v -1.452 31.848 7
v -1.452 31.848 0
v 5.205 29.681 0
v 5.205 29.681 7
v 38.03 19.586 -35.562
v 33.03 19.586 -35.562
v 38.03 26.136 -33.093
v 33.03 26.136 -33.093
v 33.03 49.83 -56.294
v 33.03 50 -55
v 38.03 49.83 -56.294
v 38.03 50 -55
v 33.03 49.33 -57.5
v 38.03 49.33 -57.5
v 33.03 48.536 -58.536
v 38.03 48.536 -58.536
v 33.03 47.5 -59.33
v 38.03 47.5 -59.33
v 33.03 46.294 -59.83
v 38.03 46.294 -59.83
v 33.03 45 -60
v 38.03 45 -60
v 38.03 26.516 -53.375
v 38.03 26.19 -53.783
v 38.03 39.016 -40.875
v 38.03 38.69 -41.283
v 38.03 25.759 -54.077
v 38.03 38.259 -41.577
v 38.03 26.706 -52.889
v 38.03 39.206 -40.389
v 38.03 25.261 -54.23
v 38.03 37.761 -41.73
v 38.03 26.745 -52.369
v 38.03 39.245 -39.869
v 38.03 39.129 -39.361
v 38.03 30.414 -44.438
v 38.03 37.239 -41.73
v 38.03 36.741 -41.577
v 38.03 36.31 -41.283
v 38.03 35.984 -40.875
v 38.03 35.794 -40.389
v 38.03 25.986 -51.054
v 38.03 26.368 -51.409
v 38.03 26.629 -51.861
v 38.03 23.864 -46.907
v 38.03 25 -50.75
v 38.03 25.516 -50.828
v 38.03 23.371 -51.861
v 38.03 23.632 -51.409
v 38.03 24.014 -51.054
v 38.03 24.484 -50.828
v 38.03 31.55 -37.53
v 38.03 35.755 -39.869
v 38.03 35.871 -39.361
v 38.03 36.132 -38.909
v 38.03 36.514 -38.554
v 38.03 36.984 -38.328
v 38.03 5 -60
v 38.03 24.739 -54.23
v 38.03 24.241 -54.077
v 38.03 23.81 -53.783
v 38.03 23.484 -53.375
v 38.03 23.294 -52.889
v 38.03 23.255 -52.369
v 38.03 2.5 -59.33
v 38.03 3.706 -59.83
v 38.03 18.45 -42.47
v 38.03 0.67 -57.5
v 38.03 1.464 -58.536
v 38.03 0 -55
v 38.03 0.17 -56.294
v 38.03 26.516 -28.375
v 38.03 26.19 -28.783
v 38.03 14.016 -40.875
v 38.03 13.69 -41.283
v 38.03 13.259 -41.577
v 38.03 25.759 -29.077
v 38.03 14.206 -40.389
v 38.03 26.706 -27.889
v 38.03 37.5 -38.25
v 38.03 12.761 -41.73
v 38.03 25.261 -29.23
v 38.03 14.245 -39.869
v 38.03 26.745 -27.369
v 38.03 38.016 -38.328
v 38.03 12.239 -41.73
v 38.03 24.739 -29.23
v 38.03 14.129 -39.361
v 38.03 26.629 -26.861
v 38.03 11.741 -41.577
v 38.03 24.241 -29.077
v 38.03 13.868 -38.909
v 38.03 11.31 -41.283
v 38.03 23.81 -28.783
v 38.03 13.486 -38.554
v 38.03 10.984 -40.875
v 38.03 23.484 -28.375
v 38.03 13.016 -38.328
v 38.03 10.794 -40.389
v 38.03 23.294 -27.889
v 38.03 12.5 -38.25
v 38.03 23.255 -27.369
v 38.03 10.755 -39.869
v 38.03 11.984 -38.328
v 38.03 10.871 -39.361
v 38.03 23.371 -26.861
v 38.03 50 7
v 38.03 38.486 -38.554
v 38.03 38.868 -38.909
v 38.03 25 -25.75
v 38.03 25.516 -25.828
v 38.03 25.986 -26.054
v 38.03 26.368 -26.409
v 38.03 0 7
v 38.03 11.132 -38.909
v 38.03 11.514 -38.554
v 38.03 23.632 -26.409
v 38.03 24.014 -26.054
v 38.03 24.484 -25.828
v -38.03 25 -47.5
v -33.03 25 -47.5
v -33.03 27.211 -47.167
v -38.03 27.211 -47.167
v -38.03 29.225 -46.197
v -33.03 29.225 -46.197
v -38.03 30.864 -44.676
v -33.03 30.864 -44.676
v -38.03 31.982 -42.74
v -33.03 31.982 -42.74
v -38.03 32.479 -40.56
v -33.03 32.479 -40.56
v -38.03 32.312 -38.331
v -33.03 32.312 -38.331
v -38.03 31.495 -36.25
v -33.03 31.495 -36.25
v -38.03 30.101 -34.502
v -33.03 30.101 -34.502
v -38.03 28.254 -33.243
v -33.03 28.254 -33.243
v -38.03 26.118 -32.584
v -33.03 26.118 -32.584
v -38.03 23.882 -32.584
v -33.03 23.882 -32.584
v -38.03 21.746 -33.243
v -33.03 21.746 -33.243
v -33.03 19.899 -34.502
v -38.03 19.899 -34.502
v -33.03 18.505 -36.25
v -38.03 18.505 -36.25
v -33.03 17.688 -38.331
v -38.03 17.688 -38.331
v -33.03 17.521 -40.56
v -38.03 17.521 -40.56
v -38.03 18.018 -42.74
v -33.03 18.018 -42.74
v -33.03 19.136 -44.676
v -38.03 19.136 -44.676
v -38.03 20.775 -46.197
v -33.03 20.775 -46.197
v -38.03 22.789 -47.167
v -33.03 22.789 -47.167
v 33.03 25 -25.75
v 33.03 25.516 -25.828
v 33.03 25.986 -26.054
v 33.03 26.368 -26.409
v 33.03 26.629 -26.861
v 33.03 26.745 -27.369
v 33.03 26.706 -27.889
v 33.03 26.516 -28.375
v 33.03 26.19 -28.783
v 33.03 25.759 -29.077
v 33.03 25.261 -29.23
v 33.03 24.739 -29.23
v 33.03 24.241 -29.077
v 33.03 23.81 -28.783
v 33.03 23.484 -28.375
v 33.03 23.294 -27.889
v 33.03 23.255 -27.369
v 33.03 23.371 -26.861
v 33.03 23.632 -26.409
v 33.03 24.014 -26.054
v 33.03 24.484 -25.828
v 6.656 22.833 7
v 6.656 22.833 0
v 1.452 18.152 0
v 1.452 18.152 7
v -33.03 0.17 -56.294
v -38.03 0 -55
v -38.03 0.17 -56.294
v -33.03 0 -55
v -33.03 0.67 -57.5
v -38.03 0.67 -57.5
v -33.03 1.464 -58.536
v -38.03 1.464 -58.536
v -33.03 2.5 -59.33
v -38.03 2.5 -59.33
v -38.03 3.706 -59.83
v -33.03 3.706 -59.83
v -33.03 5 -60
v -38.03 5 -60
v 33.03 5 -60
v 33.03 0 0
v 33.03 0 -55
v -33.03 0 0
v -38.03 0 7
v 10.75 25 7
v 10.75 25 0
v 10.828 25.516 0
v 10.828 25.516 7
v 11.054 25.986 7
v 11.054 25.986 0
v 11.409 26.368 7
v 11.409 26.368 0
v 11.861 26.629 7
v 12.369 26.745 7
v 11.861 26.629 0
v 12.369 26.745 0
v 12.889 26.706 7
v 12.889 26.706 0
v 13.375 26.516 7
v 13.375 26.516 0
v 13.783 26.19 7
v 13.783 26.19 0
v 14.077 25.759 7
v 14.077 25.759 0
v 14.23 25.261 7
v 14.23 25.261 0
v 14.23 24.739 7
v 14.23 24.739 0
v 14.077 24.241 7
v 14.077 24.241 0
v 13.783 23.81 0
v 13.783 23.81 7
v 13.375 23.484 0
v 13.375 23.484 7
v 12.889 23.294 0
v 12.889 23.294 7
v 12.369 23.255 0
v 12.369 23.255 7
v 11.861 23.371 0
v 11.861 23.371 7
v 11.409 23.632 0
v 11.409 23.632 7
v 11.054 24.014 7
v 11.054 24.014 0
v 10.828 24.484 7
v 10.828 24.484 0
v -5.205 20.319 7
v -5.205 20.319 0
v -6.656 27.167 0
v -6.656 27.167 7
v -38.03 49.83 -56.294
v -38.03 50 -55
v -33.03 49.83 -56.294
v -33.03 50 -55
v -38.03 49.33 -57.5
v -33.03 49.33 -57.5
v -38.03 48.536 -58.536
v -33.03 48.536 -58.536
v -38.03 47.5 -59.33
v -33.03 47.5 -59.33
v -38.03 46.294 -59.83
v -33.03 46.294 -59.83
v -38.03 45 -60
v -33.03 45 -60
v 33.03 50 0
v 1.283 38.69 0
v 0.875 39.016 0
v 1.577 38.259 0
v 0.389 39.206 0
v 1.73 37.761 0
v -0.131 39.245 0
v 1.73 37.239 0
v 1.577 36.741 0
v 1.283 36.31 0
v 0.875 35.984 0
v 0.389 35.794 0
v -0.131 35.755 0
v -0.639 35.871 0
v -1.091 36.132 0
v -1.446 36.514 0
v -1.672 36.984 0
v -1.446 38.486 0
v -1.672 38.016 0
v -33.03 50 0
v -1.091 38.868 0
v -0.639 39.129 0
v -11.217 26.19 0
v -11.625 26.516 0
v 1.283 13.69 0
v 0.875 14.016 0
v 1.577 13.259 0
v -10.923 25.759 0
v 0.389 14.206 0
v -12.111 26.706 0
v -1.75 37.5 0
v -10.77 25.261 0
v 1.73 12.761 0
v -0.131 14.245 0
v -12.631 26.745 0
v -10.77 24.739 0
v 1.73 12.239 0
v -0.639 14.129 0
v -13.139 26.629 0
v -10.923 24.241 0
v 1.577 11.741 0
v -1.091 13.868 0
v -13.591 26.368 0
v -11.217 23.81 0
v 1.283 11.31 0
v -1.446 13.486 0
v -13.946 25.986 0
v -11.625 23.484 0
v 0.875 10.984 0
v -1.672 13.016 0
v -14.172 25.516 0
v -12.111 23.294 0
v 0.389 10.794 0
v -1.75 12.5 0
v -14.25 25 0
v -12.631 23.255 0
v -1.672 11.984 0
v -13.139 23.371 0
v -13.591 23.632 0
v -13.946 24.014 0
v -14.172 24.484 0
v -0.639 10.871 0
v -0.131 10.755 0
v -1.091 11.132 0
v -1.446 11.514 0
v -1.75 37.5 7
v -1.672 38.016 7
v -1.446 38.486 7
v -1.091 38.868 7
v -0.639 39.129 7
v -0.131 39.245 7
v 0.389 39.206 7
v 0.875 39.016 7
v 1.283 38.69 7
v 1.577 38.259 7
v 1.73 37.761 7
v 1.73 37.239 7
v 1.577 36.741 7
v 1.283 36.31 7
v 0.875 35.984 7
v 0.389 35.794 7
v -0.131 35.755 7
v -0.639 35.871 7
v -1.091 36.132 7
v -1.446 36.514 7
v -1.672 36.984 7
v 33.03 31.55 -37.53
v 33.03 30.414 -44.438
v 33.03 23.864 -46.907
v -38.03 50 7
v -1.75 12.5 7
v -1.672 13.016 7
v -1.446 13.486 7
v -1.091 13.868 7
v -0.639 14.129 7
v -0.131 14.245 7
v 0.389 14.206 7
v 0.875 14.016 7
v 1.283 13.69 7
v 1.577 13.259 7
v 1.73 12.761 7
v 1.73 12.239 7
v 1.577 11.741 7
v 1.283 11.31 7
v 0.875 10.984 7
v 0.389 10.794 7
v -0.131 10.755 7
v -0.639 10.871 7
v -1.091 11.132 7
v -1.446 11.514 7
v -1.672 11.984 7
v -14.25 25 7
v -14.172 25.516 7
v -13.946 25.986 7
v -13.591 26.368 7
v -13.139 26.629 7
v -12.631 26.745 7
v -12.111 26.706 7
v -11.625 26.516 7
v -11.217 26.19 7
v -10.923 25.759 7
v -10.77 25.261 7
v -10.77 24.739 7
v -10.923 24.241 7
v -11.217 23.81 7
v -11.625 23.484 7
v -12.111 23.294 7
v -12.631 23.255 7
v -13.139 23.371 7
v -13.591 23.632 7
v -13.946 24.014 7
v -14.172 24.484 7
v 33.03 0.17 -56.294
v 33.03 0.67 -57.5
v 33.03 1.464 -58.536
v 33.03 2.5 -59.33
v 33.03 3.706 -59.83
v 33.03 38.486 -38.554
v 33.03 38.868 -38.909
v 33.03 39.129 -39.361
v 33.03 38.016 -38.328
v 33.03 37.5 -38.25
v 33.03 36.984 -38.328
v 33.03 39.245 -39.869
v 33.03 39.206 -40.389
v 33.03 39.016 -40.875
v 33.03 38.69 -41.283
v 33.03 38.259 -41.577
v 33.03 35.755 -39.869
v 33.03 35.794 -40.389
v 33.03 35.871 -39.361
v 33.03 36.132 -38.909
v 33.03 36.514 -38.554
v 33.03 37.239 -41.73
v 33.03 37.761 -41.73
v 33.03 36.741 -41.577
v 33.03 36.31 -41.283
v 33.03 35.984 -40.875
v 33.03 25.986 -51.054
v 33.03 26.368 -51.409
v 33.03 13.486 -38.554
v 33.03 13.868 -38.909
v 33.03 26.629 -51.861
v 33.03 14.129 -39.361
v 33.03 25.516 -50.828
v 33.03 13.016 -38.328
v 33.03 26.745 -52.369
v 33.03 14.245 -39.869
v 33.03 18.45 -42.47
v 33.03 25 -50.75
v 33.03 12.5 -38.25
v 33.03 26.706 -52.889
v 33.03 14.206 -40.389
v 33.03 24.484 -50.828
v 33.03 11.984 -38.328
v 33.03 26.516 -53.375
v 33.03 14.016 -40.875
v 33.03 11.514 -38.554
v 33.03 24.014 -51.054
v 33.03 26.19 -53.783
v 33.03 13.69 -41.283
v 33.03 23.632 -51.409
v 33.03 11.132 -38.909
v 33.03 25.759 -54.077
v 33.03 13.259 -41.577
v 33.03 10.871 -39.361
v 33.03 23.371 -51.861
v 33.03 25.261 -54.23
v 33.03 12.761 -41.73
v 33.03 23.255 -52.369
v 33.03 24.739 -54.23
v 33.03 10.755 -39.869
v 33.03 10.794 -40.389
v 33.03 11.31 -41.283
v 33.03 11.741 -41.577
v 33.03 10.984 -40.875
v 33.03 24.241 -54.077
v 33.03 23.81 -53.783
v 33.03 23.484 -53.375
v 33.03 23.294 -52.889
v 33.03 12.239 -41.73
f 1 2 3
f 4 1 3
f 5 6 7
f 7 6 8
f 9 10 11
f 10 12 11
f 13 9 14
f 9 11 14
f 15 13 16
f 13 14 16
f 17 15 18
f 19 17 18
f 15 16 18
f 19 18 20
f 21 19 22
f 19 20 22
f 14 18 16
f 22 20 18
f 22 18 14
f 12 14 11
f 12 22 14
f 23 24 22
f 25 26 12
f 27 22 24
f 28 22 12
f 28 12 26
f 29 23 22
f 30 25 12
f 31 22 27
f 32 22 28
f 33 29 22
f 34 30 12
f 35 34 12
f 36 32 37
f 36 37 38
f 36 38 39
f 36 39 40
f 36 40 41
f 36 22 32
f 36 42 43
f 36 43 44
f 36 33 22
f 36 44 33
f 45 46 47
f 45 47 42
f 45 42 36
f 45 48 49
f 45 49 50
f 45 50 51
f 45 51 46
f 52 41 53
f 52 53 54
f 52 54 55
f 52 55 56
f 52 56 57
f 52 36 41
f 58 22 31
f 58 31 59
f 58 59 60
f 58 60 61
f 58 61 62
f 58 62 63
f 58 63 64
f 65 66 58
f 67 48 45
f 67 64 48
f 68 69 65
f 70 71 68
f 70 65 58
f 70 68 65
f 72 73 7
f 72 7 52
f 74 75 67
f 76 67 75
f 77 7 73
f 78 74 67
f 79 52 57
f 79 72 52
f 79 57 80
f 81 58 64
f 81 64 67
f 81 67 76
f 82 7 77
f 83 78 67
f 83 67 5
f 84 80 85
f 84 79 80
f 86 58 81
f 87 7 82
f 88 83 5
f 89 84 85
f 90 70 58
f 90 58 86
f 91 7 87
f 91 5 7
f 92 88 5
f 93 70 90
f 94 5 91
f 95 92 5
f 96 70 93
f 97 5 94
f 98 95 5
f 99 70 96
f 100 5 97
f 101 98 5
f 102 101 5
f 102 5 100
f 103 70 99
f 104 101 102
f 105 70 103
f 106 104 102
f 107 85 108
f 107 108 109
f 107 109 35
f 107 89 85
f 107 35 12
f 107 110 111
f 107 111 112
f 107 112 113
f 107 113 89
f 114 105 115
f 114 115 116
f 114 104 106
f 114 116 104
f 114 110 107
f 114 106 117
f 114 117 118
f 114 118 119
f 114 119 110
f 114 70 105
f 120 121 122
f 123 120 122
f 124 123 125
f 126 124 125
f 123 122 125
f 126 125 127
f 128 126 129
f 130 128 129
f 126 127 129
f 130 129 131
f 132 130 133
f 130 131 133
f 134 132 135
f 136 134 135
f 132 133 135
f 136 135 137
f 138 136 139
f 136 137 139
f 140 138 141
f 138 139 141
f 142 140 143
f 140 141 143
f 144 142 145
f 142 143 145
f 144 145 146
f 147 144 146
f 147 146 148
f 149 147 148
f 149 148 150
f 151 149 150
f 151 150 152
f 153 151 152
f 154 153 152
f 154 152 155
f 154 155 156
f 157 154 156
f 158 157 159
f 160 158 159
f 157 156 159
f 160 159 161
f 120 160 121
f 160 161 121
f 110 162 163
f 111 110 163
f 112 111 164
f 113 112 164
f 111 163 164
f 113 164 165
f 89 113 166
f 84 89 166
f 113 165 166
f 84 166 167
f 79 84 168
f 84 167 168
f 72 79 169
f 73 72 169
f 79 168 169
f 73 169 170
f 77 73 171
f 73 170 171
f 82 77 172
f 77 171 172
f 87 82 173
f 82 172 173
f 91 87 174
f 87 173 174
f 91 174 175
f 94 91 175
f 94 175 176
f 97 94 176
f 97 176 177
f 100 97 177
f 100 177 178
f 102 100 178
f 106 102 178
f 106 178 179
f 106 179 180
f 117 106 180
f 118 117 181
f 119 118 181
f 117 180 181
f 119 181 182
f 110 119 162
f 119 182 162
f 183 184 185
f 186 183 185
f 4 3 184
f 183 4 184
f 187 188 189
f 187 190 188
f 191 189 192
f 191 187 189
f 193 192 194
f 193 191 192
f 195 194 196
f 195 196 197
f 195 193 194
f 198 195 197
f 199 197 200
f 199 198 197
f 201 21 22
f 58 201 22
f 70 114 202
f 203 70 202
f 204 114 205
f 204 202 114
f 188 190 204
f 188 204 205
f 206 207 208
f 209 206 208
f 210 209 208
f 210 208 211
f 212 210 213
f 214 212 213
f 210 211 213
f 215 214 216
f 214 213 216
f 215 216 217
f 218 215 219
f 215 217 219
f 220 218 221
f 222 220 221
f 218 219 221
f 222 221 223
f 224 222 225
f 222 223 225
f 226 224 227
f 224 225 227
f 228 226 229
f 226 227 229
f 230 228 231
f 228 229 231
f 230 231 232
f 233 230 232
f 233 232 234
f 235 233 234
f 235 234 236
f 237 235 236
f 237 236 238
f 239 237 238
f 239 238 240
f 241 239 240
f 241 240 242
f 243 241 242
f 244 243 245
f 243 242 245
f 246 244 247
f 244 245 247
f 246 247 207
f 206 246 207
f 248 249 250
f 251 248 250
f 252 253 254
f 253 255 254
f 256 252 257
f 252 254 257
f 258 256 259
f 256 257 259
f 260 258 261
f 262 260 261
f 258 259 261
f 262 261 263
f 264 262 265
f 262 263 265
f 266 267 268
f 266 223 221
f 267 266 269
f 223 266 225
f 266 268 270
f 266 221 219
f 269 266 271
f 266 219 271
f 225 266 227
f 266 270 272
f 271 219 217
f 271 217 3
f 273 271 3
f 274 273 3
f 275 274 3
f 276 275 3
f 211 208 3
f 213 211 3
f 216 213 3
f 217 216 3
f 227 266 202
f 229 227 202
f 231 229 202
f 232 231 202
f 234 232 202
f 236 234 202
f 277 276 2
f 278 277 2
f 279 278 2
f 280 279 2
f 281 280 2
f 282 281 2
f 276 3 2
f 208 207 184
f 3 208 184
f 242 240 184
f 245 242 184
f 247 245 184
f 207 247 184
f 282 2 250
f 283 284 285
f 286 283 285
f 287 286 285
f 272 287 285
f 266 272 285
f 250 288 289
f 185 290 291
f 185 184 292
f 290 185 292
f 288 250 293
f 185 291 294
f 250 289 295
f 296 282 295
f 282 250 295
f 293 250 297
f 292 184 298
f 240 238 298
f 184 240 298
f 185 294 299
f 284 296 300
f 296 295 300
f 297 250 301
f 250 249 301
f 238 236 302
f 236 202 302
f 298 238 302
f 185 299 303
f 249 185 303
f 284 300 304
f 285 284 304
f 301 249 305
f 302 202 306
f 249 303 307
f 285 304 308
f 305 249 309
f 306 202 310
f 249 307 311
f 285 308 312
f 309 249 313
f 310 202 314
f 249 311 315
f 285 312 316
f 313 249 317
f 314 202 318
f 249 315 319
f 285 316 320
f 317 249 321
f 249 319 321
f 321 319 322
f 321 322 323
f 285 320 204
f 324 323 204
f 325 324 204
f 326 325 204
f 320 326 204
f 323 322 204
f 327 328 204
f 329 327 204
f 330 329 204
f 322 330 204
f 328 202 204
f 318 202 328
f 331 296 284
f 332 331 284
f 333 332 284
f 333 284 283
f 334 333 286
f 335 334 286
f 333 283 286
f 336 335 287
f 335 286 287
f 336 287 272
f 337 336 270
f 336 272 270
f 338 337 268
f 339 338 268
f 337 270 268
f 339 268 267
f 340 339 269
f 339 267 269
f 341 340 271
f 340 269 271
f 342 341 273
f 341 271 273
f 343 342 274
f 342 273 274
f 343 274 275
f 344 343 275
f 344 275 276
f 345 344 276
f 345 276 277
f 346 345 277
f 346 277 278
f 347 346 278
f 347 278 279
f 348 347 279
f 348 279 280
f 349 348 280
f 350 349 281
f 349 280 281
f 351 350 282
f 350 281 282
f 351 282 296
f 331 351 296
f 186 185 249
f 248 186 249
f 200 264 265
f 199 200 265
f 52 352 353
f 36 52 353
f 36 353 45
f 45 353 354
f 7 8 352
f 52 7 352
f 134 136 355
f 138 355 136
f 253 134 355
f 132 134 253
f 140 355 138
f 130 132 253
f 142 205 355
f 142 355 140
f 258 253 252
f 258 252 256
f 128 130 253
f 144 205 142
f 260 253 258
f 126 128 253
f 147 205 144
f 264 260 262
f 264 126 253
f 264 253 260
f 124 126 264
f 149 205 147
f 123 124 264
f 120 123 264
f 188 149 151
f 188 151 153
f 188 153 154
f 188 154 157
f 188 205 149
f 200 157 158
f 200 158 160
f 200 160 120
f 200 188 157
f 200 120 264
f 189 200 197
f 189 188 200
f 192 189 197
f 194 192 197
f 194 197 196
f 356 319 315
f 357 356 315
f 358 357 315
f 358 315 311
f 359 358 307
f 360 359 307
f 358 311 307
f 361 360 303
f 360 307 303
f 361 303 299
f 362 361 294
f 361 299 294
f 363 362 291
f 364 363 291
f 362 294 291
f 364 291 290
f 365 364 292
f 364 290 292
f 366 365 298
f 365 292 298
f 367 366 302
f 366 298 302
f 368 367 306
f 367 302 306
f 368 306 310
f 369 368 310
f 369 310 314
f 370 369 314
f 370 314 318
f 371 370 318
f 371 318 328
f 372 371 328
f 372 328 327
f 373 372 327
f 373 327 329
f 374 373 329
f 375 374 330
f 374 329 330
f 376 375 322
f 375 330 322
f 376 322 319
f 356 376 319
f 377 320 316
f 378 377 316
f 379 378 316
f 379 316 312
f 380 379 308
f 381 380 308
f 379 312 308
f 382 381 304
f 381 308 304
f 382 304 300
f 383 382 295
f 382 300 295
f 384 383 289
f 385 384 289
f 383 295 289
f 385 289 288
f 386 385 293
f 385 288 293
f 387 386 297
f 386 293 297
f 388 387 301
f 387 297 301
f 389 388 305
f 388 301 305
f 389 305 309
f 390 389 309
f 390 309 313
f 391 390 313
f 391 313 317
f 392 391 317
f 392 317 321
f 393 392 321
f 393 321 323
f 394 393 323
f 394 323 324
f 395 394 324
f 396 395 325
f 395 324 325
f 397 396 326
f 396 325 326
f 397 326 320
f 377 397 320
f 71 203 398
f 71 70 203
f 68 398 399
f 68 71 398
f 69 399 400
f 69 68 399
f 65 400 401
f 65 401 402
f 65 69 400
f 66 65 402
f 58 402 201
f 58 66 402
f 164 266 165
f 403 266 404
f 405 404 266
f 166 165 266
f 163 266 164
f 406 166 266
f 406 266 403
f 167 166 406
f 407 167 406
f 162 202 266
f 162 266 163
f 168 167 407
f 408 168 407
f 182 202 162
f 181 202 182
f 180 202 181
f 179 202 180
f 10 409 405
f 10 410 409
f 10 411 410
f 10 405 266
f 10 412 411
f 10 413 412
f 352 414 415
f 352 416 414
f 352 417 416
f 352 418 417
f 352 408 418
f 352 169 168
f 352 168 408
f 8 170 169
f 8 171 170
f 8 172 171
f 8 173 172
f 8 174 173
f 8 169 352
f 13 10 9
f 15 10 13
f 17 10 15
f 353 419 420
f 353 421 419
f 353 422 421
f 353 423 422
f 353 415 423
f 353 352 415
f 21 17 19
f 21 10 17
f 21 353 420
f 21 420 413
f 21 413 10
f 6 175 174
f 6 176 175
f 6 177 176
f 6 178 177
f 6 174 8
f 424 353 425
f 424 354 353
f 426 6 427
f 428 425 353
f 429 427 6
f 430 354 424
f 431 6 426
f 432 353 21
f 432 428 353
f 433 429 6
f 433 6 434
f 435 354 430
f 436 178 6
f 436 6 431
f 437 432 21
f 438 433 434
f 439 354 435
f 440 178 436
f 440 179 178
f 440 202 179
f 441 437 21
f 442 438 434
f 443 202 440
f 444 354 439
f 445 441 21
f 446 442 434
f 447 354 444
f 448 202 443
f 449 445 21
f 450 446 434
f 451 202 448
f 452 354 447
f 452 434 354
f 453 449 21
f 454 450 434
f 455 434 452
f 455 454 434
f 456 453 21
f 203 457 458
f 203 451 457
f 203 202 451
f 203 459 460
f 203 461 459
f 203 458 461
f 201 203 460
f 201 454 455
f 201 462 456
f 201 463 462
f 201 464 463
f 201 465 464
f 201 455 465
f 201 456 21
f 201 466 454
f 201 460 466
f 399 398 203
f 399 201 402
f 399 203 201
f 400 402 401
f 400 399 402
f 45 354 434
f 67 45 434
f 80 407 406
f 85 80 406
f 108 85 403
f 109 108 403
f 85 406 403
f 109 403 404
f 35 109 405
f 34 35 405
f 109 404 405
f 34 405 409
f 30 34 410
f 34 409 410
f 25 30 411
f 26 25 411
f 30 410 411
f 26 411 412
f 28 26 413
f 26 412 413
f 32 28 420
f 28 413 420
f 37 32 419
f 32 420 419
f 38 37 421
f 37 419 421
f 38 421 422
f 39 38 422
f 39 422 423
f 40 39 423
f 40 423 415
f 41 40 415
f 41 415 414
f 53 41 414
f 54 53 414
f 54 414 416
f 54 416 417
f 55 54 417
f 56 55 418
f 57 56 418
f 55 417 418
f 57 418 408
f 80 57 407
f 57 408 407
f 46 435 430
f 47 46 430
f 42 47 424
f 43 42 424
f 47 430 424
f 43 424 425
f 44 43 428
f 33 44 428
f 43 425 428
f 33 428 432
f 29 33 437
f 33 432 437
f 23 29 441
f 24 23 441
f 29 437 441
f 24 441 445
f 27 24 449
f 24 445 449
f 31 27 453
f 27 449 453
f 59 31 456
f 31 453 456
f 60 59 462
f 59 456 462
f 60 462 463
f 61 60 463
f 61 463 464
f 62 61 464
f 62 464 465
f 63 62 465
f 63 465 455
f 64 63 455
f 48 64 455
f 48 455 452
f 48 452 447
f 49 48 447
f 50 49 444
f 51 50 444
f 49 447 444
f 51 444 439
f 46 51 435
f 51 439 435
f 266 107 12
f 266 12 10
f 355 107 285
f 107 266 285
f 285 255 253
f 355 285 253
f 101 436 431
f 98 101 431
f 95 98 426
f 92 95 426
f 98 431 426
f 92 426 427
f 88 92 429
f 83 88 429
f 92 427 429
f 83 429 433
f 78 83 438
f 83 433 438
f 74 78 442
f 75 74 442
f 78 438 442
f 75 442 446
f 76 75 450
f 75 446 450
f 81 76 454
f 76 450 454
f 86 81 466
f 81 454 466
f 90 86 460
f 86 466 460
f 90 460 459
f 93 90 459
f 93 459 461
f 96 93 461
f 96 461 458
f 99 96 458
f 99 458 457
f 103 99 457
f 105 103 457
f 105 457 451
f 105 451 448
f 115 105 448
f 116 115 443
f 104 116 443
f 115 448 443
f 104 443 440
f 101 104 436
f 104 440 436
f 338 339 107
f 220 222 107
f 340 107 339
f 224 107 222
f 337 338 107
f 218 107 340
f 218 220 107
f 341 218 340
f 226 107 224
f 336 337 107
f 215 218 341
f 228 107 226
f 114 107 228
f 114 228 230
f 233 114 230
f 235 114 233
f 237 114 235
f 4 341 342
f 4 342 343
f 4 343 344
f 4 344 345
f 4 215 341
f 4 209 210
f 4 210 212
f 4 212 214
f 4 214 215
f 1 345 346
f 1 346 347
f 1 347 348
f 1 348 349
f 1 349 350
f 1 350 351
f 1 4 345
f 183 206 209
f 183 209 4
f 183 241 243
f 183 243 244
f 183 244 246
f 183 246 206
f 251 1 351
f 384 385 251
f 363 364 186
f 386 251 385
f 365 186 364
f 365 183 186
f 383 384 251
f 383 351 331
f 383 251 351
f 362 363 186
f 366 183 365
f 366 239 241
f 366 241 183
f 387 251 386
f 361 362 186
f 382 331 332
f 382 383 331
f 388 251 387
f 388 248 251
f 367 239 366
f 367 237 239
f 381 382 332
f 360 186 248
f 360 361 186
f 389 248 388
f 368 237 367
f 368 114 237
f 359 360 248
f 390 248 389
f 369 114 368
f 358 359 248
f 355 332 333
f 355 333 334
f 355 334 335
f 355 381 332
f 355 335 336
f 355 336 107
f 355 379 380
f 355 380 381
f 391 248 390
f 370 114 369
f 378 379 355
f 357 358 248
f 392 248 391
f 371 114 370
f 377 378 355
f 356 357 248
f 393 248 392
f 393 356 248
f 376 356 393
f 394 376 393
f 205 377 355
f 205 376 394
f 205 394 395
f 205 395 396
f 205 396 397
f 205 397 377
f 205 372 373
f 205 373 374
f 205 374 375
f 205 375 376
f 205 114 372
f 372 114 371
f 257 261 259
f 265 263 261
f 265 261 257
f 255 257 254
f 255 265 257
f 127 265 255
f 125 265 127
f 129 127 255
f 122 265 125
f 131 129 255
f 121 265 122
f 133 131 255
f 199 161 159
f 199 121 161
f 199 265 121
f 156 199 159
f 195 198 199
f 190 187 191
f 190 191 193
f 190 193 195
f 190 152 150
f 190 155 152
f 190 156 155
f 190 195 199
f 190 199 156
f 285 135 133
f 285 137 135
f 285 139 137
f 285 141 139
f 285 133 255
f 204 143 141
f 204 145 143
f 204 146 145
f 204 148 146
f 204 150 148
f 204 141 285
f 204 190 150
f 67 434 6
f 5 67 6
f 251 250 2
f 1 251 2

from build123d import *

# Parameters (mm, degrees)
BOSS_EXTRUDE1_DEPTH = 50
SKETCH3_R           = 7.5
CUT_EXTRUDE1_DEPTH  = 5
CUT_EXTRUDE2_DEPTH  = 5
CUT_EXTRUDE3_DEPTH  = 7
SKETCH4_3_R         = 1.75
CUT_EXTRUDE4_DEPTH  = 5
SKETCH5_3_R         = 1.75
CUT_EXTRUDE6_DEPTH  = 7
FILLET1_R           = 5


with BuildPart() as part:
    # Sketch1 → Boss-Extrude1 (new body)
    with BuildSketch(Plane(origin=(0, 0, 0), x_dir=(1, 0, 0), z_dir=(0, 1, 0))):
        Polygon((0, 0), (33.03, 0), (33.03, 60), (38.03, 60), (38.03, -7), (-38.03, -7), (-38.03, 60), (-33.03, 60), (-33.03, 0), align=None)
    extrude(amount=BOSS_EXTRUDE1_DEPTH)

    # Sketch3 → Cut-Extrude1 (cut)
    with BuildSketch(Plane(origin=(-33.03, 0, 0), x_dir=(0, 0, -1), z_dir=(1, 0, 0))):
        with Locations((40, 25)):
            Circle(SKETCH3_R)
    extrude(amount=-CUT_EXTRUDE1_DEPTH, mode=Mode.SUBTRACT)

    # Sketch4 → Cut-Extrude2 (cut)
    with BuildSketch(Plane.ZY.offset(-33.03)):
        Polygon((-46.907161244, 23.863723826), (-42.46953659, 18.450084807), (-35.562375345, 19.586360981), (-33.092838756, 26.136276174), (-37.53046341, 31.549915193), (-44.437624655, 30.413639019), align=None)
    extrude(amount=-CUT_EXTRUDE2_DEPTH, mode=Mode.SUBTRACT)

    # Sketch5 → Cut-Extrude3 (cut)
    with BuildSketch(Plane(origin=(0, 0, 0), x_dir=(-1, 0, 0), z_dir=(0, 0, -1))):
        Polygon((1.451740182, 31.847806251), (-5.204504082, 29.681147002), (-6.656244264, 22.833340752), (-1.451740182, 18.152193749), (5.204504082, 20.318852998), (6.656244264, 27.166659248), align=None)
    extrude(amount=-CUT_EXTRUDE3_DEPTH, mode=Mode.SUBTRACT)

    # Sketch4<3> → Cut-Extrude4 (cut)
    with BuildSketch(Plane.ZY.offset(-33.03)):
        with Locations((-52.5, 25)):
            Circle(SKETCH4_3_R)
        with Locations((-40, 37.5)):
            Circle(SKETCH4_3_R)
        with Locations((-40, 12.5)):
            Circle(SKETCH4_3_R)
        with Locations((-27.5, 25)):
            Circle(SKETCH4_3_R)
    extrude(amount=-CUT_EXTRUDE4_DEPTH, mode=Mode.SUBTRACT)

    # Sketch5<3> → Cut-Extrude6 (cut)
    with BuildSketch(Plane(origin=(0, 0, 0), x_dir=(-1, 0, 0), z_dir=(0, 0, -1))):
        with Locations((0, 37.5)):
            Circle(SKETCH5_3_R)
        with Locations((-12.5, 25)):
            Circle(SKETCH5_3_R)
        with Locations((0, 12.5)):
            Circle(SKETCH5_3_R)
        with Locations((12.5, 25)):
            Circle(SKETCH5_3_R)
    extrude(amount=-CUT_EXTRUDE6_DEPTH, mode=Mode.SUBTRACT)

    # Fillet1
    fillet1_edges = [part.edges().sort_by_distance(p)[0] for p in [
        (35.53, 0, -60),
        (-35.53, 0, -60),
        (-35.53, 50, -60),
        (35.53, 50, -60),
    ]]
    fillet(fillet1_edges, radius=FILLET1_R)


solid = part.part
